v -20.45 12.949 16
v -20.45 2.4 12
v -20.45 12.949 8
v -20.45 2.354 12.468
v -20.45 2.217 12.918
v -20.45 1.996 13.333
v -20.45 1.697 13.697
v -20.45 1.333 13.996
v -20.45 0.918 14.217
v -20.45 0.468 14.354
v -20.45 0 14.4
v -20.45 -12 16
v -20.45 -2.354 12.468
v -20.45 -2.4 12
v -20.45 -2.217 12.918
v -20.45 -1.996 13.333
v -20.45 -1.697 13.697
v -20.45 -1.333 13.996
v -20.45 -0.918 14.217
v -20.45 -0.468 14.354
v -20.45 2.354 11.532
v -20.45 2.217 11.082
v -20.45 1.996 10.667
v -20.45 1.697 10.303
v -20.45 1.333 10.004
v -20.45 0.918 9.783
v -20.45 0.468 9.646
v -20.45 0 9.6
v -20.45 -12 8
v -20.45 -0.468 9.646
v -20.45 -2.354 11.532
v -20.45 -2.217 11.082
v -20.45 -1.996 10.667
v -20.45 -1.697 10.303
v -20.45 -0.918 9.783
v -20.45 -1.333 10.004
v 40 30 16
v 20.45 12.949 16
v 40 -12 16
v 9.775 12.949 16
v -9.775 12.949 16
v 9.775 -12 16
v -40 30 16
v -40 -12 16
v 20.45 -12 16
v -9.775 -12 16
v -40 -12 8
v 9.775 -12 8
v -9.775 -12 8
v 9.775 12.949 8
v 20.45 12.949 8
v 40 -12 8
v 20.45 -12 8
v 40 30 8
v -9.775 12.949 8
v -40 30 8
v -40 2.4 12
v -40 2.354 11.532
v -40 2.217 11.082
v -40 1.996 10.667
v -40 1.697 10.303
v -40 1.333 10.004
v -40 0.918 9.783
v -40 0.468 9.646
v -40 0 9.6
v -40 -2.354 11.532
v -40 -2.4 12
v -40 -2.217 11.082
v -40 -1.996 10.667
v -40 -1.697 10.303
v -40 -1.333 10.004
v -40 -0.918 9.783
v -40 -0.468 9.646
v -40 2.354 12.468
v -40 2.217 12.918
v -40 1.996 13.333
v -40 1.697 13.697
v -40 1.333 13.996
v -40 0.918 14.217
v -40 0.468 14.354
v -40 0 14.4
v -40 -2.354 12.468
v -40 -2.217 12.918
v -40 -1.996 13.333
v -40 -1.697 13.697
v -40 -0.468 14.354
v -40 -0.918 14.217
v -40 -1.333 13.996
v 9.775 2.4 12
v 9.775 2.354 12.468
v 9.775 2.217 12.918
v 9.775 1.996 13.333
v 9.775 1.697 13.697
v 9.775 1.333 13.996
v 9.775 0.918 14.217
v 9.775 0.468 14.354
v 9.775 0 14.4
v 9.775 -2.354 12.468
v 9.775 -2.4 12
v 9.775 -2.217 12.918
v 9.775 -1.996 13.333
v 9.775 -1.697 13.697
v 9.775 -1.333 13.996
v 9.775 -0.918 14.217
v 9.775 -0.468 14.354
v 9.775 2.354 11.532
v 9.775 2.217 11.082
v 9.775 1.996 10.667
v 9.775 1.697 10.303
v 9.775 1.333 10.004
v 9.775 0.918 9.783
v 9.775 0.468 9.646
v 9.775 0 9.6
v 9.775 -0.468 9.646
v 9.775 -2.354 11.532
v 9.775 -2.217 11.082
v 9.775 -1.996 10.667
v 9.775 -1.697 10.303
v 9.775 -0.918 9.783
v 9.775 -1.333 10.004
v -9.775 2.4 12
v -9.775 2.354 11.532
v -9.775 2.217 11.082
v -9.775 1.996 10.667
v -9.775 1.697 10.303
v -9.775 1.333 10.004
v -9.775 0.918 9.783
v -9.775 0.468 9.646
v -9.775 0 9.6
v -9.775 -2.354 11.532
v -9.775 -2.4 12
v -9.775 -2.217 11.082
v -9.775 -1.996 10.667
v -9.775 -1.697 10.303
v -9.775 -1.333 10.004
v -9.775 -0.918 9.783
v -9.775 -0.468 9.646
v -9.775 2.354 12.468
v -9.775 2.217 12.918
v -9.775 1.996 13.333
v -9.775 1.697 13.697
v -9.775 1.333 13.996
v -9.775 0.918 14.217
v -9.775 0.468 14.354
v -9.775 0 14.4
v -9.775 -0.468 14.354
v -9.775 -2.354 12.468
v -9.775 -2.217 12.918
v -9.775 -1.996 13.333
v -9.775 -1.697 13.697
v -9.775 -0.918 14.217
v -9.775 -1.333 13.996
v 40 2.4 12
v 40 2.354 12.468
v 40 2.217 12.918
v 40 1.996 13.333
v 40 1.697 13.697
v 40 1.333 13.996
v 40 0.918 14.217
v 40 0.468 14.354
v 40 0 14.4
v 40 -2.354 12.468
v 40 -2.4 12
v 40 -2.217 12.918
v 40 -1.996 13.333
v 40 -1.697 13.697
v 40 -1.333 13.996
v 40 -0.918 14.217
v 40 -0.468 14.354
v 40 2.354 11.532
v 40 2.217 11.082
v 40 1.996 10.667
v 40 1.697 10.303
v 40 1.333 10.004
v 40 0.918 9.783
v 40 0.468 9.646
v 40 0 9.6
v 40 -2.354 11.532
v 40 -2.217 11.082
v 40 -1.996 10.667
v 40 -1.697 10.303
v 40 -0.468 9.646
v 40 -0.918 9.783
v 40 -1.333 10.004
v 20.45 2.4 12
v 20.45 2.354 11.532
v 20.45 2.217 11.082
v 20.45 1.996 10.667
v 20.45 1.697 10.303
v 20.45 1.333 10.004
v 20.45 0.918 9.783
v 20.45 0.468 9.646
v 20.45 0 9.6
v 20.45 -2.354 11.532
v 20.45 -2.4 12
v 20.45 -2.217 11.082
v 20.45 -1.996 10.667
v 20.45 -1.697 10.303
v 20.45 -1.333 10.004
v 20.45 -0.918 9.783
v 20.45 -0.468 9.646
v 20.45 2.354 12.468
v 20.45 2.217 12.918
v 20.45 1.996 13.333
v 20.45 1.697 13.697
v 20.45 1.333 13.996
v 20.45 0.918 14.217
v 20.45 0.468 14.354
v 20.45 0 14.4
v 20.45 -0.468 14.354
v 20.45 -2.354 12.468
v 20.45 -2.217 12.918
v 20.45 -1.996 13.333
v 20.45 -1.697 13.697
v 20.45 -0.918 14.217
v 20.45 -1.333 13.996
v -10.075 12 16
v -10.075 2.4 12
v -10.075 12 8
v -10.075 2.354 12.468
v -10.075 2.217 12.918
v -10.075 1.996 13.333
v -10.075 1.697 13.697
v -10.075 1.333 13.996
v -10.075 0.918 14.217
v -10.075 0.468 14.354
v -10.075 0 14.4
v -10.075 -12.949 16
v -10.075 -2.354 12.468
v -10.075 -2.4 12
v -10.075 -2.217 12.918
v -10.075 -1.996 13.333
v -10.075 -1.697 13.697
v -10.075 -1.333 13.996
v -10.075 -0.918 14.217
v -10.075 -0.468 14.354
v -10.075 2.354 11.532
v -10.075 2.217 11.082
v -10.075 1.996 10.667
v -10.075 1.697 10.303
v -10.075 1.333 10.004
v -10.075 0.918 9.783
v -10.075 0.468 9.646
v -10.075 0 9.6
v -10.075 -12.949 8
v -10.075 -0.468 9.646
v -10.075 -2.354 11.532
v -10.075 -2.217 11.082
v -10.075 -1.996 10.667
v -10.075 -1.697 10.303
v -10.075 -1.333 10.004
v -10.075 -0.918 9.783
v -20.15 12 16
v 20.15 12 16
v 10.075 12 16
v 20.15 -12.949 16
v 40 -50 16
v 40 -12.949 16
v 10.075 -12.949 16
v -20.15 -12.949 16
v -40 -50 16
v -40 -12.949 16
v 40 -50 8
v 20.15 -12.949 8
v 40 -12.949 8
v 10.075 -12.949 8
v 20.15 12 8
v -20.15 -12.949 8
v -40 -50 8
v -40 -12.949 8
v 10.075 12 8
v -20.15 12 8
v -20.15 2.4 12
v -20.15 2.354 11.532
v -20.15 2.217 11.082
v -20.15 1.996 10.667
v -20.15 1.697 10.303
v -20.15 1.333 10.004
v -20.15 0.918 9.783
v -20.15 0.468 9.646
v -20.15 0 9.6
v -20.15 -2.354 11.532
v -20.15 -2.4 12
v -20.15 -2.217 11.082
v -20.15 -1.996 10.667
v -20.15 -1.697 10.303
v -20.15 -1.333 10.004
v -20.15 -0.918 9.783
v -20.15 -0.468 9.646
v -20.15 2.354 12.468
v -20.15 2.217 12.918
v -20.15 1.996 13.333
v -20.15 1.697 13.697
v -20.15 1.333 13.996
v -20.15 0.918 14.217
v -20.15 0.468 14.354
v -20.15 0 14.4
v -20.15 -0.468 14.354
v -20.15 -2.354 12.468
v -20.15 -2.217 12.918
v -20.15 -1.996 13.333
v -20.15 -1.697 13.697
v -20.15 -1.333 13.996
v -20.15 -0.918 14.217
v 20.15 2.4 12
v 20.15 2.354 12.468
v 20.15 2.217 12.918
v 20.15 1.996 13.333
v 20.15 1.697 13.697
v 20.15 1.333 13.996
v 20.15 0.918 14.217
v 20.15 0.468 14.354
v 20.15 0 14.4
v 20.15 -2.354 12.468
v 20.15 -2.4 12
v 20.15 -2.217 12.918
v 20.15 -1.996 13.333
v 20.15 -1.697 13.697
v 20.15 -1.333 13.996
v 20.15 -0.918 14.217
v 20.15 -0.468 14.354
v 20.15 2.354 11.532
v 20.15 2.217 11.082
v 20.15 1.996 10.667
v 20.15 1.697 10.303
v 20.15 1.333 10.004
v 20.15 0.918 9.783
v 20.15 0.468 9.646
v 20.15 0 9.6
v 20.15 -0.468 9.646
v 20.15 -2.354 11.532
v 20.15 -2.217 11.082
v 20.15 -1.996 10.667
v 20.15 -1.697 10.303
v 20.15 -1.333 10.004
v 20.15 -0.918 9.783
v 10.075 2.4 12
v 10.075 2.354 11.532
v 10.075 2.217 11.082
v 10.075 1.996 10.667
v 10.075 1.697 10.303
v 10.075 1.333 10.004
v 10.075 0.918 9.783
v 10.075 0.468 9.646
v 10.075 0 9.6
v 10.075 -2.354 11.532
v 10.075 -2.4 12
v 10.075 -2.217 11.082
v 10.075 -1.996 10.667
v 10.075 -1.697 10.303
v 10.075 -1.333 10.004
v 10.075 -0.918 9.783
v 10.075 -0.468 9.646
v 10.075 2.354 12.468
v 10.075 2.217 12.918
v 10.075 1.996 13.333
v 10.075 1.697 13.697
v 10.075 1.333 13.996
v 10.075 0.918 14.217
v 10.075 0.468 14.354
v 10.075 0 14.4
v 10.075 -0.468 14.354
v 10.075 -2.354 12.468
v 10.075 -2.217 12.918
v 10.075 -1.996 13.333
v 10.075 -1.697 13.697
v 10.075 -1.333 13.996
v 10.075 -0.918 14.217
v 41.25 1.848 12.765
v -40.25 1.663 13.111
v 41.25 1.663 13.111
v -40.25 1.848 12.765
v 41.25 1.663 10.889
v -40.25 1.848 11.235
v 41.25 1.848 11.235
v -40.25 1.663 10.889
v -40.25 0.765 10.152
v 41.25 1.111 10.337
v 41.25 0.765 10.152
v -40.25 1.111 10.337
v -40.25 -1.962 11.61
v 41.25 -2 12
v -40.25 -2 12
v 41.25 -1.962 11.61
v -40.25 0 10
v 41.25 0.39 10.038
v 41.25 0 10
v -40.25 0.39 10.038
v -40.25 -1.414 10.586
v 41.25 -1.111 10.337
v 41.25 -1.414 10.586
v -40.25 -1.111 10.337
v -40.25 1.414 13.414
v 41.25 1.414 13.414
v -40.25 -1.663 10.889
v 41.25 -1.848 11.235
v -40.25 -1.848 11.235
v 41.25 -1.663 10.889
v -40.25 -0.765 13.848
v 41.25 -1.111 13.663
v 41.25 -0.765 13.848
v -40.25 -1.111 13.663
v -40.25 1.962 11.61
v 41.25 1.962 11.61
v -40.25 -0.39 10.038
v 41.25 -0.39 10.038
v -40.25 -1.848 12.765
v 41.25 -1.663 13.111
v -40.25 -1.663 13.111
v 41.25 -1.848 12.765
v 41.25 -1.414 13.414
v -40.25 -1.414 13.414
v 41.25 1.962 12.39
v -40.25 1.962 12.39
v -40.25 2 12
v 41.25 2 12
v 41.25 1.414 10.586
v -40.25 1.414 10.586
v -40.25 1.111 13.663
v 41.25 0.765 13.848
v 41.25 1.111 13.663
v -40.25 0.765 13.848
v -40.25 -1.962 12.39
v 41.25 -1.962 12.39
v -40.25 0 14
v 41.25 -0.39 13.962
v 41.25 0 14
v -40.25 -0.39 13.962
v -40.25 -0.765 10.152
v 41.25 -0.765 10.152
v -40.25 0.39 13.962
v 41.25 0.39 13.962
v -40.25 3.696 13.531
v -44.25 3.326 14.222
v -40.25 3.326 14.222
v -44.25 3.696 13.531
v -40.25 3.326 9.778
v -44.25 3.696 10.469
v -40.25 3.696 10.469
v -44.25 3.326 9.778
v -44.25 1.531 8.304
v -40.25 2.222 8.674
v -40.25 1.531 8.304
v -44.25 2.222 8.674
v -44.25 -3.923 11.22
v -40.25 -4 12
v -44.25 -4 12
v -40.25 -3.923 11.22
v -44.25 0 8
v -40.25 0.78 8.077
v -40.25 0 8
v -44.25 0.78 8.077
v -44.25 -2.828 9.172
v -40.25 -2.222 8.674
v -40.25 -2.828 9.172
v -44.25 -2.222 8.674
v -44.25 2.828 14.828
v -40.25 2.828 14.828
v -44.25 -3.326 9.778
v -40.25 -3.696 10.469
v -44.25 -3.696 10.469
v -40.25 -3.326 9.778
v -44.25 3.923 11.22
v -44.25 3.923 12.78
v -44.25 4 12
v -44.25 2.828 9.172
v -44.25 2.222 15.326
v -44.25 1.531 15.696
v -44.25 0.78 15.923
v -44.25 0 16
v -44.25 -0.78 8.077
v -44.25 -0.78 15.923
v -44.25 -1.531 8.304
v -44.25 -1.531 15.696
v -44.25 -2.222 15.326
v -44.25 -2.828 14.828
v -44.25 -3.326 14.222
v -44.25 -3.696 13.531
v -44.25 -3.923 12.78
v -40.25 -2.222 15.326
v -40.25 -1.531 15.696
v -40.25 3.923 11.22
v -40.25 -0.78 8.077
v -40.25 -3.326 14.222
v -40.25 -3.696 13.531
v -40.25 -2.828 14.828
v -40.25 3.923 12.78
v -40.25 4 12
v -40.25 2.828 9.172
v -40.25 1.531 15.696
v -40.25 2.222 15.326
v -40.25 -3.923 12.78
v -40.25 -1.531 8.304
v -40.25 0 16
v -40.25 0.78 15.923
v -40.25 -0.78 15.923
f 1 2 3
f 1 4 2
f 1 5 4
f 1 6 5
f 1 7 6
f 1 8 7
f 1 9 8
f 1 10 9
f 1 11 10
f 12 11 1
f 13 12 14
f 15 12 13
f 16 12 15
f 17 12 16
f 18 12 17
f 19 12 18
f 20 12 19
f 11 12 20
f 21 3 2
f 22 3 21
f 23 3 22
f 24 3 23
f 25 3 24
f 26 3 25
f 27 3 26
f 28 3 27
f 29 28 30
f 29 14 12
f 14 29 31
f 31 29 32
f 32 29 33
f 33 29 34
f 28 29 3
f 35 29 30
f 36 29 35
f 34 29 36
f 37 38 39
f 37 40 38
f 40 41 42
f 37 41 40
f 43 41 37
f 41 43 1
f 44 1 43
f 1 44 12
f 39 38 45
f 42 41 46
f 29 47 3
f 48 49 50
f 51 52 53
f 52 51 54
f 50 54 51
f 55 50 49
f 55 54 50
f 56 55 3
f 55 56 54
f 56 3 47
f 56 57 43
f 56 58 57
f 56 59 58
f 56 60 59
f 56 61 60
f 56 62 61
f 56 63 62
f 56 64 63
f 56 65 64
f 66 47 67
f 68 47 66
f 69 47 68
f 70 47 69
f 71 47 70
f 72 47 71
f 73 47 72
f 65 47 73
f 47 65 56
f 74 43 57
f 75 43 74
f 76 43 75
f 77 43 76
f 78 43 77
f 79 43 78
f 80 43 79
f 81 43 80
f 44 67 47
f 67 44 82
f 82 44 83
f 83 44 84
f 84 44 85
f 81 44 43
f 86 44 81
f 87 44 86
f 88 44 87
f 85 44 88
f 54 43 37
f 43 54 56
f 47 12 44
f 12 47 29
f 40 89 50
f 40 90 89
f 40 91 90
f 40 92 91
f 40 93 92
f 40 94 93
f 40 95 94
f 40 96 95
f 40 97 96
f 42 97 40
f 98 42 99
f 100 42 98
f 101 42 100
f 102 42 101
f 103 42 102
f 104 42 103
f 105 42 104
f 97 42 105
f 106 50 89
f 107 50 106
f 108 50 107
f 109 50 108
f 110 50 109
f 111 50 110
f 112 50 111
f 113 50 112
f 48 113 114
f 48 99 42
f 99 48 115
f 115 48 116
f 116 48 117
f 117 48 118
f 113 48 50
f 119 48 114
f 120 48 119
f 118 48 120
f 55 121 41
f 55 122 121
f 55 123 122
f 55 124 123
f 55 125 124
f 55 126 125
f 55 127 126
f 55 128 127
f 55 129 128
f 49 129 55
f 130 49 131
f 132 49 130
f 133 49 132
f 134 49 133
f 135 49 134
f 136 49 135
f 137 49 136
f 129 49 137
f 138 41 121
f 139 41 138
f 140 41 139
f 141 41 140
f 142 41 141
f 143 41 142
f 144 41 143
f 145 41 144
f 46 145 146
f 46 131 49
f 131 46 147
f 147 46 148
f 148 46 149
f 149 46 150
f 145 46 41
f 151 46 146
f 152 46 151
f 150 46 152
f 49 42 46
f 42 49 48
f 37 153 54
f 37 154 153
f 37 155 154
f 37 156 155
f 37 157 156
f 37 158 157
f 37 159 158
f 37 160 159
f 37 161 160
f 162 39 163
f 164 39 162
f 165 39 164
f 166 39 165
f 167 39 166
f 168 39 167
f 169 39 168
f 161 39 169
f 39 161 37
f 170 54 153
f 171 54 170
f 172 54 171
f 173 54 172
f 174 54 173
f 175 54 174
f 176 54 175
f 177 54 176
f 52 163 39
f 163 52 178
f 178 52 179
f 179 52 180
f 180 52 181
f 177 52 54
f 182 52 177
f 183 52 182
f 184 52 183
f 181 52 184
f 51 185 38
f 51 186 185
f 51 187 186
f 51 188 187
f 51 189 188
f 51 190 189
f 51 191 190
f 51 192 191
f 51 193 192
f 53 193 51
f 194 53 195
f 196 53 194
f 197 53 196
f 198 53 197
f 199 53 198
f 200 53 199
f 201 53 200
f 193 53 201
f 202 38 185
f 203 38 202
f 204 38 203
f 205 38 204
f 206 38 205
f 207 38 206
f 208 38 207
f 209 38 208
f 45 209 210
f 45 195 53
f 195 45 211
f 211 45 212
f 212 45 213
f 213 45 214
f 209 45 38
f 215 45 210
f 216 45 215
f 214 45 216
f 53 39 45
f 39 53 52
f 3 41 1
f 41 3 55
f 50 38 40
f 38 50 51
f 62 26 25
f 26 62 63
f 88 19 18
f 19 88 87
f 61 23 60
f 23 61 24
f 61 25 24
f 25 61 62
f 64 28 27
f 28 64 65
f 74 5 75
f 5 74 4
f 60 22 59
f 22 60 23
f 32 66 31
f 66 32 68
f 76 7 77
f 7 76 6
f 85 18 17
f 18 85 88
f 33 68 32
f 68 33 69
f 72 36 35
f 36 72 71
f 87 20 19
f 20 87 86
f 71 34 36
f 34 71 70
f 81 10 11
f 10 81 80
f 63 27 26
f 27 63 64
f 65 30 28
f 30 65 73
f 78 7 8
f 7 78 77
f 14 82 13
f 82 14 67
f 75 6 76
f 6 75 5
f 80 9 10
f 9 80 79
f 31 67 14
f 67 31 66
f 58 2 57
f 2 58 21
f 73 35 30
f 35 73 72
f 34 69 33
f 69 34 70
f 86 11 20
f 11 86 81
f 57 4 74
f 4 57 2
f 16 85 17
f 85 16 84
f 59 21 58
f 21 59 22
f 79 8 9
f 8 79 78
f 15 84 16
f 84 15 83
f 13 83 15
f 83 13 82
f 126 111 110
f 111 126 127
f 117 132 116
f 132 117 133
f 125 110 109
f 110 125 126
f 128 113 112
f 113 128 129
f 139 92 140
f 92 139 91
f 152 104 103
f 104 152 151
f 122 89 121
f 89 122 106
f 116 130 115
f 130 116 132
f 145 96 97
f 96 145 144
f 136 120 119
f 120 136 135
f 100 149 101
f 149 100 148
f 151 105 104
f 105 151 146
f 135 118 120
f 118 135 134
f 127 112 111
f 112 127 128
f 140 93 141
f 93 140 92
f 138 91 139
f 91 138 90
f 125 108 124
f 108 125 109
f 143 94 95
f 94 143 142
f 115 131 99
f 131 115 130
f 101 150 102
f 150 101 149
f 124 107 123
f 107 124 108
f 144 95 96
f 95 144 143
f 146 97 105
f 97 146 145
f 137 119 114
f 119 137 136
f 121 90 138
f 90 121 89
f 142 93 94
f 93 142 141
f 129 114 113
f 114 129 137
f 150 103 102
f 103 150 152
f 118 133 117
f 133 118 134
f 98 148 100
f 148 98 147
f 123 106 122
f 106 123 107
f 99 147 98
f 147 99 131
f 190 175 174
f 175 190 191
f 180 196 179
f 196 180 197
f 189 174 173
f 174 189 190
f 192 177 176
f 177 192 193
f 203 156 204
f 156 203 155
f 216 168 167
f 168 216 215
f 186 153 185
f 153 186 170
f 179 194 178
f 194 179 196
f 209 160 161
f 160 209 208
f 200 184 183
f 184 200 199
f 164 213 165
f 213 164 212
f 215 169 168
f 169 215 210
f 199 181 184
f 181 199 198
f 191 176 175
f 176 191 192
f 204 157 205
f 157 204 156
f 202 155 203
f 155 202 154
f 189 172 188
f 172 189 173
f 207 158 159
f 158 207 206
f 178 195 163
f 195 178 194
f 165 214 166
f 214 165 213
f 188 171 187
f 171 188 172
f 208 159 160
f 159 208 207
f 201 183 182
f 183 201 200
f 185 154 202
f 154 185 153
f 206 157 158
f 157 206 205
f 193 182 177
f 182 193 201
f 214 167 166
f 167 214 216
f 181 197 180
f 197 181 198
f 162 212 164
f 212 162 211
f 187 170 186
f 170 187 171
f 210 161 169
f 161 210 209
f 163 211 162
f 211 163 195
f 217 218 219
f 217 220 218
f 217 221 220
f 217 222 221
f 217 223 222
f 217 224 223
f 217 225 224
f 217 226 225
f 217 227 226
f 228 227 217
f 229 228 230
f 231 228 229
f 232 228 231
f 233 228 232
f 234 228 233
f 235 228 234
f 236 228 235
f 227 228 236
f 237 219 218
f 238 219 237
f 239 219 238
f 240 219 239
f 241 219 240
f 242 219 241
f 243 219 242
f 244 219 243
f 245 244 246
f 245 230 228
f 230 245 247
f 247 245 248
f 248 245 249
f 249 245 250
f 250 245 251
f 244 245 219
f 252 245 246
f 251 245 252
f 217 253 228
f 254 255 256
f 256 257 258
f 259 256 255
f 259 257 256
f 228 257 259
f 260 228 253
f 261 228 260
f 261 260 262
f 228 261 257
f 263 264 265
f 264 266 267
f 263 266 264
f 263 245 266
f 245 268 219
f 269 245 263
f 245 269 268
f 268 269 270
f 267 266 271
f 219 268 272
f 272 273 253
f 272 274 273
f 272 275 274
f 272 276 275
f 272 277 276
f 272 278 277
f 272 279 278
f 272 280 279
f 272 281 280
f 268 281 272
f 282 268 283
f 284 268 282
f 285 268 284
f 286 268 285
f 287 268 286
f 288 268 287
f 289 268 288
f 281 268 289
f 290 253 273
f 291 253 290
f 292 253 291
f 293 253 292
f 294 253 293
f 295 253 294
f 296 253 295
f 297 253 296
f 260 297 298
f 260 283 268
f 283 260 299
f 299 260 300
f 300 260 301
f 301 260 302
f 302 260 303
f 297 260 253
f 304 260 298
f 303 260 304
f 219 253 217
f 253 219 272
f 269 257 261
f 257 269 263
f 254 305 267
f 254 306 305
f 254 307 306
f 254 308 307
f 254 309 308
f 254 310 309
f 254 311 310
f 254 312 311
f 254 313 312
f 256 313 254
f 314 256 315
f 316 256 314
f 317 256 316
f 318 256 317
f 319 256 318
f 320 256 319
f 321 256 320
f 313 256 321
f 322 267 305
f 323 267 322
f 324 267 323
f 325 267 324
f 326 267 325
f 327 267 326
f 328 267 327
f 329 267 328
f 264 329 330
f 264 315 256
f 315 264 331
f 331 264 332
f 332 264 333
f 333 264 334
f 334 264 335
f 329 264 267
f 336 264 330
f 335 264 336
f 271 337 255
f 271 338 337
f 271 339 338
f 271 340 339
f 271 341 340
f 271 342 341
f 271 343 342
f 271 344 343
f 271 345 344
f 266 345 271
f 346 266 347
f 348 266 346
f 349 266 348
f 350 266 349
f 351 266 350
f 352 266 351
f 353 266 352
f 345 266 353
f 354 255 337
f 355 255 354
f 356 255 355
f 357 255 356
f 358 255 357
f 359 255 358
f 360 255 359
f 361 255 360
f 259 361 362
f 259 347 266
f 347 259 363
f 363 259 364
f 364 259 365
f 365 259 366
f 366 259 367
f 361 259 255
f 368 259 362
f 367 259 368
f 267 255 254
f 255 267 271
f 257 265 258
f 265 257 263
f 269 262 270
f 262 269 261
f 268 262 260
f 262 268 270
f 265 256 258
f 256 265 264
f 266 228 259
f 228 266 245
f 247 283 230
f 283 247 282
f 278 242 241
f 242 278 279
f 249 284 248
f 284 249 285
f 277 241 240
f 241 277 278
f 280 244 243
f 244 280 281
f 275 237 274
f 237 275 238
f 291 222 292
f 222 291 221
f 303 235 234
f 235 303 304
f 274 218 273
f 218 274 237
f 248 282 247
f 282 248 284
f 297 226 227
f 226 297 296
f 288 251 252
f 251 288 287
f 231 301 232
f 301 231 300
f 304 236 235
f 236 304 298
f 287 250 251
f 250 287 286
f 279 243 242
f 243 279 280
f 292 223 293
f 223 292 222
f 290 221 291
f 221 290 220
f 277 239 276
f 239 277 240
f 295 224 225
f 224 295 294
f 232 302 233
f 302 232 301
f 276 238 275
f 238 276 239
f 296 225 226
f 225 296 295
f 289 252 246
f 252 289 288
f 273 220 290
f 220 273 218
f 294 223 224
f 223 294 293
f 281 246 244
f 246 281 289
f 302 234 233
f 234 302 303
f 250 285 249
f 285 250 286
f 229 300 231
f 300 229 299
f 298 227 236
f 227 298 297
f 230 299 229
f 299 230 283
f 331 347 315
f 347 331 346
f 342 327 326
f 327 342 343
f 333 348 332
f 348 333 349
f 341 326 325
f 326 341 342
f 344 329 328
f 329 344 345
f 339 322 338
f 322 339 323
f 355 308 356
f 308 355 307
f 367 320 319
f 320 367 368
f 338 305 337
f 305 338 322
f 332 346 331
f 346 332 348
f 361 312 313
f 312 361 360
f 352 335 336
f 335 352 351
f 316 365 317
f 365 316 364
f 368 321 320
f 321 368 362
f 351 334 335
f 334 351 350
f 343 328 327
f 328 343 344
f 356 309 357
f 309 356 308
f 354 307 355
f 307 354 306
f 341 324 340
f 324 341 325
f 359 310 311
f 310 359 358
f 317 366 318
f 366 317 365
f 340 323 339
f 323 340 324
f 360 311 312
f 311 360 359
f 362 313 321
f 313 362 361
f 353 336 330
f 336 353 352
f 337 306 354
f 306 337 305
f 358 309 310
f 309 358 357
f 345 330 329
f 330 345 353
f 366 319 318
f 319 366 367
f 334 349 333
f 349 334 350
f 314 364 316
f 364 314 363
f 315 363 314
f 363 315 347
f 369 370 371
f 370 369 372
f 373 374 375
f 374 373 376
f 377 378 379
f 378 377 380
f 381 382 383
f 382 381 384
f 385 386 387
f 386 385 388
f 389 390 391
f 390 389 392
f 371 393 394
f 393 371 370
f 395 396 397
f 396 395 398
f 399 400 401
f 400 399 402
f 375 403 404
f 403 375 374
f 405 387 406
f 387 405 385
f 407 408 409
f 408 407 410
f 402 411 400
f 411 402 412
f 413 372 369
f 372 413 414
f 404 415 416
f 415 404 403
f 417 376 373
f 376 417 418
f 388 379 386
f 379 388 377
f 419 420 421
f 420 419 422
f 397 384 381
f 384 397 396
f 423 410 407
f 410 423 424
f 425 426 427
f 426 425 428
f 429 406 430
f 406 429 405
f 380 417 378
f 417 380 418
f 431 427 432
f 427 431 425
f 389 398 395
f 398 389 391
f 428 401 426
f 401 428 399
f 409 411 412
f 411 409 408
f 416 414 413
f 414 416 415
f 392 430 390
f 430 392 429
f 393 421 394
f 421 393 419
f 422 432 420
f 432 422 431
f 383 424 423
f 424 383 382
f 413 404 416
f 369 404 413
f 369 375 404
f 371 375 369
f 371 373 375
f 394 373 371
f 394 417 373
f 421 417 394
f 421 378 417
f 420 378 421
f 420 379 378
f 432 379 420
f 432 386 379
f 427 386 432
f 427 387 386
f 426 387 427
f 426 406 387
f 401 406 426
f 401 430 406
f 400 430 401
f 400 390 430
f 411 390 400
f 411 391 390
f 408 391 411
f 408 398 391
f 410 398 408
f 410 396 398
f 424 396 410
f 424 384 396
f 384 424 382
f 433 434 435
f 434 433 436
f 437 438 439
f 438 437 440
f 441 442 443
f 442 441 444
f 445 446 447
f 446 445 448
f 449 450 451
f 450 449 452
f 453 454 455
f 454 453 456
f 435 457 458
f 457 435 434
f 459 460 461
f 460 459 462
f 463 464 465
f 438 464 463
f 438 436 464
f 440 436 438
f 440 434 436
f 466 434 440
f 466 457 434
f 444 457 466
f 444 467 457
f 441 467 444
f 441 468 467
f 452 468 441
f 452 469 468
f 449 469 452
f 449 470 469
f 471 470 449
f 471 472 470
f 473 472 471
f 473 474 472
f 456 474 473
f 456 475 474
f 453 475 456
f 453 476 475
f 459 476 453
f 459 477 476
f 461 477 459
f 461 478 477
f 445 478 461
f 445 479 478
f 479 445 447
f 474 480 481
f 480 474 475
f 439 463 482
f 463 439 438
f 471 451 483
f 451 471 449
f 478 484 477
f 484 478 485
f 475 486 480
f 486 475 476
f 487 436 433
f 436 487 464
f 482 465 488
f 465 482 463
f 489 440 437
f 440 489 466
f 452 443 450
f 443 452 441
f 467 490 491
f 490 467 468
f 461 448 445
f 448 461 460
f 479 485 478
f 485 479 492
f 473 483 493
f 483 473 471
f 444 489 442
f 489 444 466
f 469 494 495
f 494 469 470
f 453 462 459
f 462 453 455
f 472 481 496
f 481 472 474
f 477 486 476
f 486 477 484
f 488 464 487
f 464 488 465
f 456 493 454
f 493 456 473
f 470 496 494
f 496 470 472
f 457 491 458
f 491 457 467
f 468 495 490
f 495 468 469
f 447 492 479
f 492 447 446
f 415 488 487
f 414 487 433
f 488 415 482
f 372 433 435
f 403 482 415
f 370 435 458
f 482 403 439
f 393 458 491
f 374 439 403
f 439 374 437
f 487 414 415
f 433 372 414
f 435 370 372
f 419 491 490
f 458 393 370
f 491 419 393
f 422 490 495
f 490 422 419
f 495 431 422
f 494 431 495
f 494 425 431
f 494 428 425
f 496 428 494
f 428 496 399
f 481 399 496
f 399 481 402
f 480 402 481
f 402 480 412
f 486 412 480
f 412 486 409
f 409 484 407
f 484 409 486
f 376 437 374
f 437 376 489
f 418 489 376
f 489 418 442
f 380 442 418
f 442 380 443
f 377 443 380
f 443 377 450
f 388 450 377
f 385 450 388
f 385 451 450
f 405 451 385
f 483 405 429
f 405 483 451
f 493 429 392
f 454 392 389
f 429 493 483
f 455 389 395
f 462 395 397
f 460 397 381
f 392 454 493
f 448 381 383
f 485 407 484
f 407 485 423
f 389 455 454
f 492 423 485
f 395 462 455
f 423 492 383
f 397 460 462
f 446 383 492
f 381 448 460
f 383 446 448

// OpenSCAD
$fn = 32;

// ------------------------------------------------------------------------
// Butt hinge: hinge 80 mm, leaf swung 0 deg
// Every part is its own module, assembly() places every instance.
// ------------------------------------------------------------------------

// --- part 1 ---
module hinge_base() {
  difference() {
    union() {
      translate([-40, -12, -4]) cube([19.55, 42, 8]);
      translate([-9.775, -12, -4]) cube([19.55, 42, 8]);
      translate([20.45, -12, -4]) cube([19.55, 42, 8]);
      translate([-40, 12.949, -4]) cube([80, 17.051, 8]);
    }
    translate([-30.225, 0, 0]) rotate([0, 90, 0]) cylinder(h = 21.55, d = 4.8, center = true);
    translate([0, 0, 0]) rotate([0, 90, 0]) cylinder(h = 21.55, d = 4.8, center = true);
    translate([30.225, 0, 0]) rotate([0, 90, 0]) cylinder(h = 21.55, d = 4.8, center = true);
  }
}

// --- part 2 ---
module hinge_mover() {
  difference() {
    union() {
      translate([-20.15, -50, -4]) cube([10.075, 62, 8]);
      translate([10.075, -50, -4]) cube([10.075, 62, 8]);
      translate([-40, -50, -4]) cube([80, 37.051, 8]);
    }
    translate([-15.113, 0, 0]) rotate([0, 90, 0]) cylinder(h = 12.075, d = 4.8, center = true);
    translate([15.113, 0, 0]) rotate([0, 90, 0]) cylinder(h = 12.075, d = 4.8, center = true);
  }
}

// --- part 3 ---
module hinge_pin() {
  rotate([0, 90, 0]) cylinder(h = 82.5, d = 4, center = true);
  translate([-44.25, 0, 0]) rotate([0, 90, 0]) cylinder(h = 4, d = 8);
}

// --- assembly ---
module assembly() {
  color([0.80, 0.24, 0.20]) translate([0, 0, 12]) rotate([0, 0, 0]) hinge_base();
  color([0.20, 0.45, 0.75]) translate([0, 0, 12]) rotate([0, 0, 0]) hinge_mover();
  color([0.25, 0.62, 0.32]) translate([0, 0, 12]) rotate([0, 0, 0]) hinge_pin();
}

assembly();
